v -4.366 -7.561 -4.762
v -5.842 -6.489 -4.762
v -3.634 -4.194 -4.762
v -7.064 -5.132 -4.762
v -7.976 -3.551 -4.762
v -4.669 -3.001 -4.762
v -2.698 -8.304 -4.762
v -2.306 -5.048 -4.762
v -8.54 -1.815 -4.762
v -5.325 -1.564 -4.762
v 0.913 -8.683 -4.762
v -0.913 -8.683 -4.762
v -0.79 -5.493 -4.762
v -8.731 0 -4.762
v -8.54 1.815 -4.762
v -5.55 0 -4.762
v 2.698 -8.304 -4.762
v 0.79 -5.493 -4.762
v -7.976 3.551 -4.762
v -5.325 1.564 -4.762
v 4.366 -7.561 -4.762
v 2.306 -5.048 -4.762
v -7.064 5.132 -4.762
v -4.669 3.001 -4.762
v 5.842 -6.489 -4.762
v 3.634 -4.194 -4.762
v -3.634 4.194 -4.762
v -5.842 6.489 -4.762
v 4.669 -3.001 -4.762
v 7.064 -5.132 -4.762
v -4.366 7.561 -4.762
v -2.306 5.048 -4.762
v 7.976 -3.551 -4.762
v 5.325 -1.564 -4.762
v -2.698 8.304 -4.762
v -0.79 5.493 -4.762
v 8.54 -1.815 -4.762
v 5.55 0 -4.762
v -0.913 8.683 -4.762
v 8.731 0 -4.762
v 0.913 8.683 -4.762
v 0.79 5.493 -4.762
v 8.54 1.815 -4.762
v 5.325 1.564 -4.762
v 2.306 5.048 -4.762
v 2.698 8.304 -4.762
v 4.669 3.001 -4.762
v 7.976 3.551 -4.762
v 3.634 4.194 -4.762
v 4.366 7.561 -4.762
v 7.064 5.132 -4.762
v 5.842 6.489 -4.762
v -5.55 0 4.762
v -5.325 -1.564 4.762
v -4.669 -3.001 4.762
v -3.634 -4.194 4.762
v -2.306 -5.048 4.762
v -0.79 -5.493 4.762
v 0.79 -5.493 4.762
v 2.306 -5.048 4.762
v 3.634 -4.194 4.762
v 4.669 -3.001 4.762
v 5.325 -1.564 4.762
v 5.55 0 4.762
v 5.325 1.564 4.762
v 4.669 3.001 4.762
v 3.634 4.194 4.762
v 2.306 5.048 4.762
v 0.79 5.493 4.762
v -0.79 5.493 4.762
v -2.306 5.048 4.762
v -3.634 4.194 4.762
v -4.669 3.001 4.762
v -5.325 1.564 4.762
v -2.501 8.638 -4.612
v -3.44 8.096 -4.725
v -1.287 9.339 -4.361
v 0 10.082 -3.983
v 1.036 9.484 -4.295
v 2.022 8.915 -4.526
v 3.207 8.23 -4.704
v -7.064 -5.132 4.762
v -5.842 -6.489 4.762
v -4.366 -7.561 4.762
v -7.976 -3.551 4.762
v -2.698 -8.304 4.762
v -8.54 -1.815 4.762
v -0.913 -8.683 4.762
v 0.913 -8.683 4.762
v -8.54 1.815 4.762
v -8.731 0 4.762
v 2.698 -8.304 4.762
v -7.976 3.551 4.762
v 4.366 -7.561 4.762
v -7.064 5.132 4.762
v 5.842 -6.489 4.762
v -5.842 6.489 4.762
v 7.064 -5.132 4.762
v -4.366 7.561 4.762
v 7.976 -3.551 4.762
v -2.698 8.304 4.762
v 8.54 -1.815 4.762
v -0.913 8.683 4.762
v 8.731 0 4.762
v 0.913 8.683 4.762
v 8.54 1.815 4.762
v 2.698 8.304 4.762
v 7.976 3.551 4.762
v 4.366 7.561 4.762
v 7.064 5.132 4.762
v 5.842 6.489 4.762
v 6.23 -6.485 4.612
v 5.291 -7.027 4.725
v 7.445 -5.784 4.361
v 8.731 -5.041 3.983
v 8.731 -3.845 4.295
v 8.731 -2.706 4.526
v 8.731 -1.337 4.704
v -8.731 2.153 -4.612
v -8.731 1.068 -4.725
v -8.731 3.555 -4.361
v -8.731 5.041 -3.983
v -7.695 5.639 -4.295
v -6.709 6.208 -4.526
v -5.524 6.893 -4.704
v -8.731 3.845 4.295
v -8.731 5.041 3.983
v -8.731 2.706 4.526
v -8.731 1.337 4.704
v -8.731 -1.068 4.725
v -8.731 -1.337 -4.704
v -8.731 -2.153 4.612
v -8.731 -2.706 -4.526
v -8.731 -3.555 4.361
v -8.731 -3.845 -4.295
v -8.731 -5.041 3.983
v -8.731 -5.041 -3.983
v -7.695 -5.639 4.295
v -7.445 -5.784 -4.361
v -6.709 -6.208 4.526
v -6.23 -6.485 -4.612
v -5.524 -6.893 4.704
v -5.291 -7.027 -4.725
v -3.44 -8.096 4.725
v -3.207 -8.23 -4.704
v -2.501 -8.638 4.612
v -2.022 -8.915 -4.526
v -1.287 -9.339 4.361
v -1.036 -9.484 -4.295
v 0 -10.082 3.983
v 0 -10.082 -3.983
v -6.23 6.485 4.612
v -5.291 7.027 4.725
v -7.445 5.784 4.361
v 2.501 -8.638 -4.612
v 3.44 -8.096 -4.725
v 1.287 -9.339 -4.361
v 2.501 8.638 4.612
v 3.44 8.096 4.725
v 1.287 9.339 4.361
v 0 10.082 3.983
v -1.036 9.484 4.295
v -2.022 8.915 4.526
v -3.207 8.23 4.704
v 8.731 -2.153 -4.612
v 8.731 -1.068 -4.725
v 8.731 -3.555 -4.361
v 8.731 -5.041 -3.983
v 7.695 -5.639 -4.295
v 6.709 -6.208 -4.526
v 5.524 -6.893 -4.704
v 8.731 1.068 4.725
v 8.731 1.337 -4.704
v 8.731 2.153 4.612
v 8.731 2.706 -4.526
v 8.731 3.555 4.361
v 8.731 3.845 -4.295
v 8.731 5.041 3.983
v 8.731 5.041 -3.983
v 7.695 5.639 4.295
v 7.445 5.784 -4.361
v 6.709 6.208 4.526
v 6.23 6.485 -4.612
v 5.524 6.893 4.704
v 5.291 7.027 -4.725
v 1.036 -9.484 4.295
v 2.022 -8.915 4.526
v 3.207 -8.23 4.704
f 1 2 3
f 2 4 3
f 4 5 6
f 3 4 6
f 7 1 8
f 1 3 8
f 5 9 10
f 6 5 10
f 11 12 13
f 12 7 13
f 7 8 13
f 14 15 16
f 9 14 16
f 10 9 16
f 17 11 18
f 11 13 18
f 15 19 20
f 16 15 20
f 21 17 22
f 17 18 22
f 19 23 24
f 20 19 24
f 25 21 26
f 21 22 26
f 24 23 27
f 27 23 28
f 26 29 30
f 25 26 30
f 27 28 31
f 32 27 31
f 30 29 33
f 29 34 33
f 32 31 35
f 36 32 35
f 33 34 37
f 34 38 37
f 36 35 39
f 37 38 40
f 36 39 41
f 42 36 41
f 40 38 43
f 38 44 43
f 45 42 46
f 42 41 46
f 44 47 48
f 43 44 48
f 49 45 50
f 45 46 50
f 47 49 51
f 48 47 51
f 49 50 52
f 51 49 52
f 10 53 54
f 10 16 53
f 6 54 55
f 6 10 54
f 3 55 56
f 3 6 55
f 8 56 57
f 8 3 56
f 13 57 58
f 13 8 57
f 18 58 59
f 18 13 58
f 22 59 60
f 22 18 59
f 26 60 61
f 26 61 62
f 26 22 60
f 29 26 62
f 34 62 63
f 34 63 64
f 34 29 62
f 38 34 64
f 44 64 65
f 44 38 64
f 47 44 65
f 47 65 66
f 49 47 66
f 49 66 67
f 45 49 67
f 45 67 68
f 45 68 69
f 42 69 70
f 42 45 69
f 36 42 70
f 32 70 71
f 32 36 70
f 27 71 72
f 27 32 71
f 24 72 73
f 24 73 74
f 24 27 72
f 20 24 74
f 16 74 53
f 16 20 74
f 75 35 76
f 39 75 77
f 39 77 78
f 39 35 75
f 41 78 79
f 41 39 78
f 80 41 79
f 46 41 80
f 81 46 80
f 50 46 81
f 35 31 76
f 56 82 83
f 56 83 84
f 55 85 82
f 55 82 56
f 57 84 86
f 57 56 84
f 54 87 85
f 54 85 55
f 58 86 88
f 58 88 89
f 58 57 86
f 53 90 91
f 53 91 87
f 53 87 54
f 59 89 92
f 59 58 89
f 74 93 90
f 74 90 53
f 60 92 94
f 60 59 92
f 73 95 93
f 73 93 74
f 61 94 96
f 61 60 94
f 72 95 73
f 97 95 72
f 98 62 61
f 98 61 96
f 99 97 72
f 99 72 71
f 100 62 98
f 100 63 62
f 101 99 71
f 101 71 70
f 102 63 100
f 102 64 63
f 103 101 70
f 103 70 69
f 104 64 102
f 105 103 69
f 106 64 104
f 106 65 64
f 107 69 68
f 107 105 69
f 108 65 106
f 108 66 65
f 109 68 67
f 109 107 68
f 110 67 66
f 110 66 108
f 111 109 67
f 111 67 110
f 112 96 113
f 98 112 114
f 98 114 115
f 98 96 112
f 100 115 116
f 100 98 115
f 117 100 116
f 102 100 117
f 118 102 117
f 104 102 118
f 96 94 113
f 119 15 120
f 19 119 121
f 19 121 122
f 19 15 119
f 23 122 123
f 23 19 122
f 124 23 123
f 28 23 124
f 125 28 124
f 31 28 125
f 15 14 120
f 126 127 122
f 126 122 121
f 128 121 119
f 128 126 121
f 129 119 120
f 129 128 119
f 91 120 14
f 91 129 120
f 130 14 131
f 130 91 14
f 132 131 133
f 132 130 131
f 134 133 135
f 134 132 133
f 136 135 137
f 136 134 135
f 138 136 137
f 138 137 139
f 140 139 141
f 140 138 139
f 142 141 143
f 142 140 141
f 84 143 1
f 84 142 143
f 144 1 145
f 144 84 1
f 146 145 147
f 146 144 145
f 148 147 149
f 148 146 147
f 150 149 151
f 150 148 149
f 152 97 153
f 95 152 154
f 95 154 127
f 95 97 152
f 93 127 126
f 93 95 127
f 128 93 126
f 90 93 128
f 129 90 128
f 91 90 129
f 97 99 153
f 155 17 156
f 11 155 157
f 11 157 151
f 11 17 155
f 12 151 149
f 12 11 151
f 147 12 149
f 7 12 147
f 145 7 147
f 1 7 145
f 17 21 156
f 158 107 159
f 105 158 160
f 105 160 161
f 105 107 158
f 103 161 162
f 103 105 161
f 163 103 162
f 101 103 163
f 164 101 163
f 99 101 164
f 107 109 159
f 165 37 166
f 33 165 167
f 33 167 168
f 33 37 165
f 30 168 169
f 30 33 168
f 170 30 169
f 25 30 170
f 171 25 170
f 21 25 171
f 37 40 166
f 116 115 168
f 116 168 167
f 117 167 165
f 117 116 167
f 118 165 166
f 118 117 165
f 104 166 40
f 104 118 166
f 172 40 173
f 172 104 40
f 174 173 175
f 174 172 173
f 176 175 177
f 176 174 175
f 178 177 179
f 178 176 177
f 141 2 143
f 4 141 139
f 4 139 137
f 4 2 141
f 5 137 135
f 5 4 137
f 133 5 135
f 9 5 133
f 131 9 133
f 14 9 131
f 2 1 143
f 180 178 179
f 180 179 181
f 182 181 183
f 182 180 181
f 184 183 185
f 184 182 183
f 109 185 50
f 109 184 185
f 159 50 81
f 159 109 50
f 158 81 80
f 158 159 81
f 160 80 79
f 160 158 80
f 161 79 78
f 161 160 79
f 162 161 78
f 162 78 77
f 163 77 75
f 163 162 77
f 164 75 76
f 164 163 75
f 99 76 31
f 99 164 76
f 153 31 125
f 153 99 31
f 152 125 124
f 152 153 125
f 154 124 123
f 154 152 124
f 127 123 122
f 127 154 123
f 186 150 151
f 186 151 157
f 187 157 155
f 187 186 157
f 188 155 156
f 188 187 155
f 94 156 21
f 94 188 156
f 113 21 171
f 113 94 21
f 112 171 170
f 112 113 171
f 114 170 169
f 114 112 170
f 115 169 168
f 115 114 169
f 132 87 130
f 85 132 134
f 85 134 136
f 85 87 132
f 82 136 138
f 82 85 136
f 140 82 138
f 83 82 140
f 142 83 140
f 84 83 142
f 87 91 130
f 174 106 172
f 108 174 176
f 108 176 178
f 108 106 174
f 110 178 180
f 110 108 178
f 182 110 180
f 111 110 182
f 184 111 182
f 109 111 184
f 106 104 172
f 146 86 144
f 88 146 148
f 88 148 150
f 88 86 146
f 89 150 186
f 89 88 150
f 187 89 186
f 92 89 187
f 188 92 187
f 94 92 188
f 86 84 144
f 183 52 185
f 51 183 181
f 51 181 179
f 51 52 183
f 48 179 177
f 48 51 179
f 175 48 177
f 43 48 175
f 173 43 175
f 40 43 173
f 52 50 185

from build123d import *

# Parameters (mm, degrees)
SKETCH1_R               = 5.5499
EXTRUDE1_DEPTH          = 4.7625
SKETCH7_OUTSIDE_W       = 113.114
SKETCH7_OUTSIDE_H       = 115.816
SKETCH7_OUTSIDE_R       = 8.73125
EXTRUDE2_DEPTH          = 25.4
EXTRUDE2_DRAFT          = -60
MIRROR1_COPY_1_SKETCH_W = 113.114
MIRROR1_COPY_1_SKETCH_H = 115.816
MIRROR1_COPY_1_SKETCH_R = 8.73125
MIRROR1_COPY_1_DEPTH    = 25.4
MIRROR1_COPY_1_DRAFT    = -60


with BuildPart() as part:
    # Sketch1 → Extrude1 (new, symmetric)
    with BuildSketch(Plane.XY):
        Polygon((-8.73125, 5.040989538), (-8.73125, -5.040989538), (0, -10.081979076), (8.73125, -5.040989538), (8.73125, 5.040989538), (0, 10.081979076), align=None)
        Circle(SKETCH1_R, mode=Mode.SUBTRACT)
    extrude(amount=EXTRUDE1_DEPTH, both=True)


with BuildPart() as extrude2_tool:
    # Sketch7 outside → Extrude2 (with draft: the straight prism first)
    with BuildSketch(Plane.XY.offset(4.7625)):
        Rectangle(SKETCH7_OUTSIDE_W, SKETCH7_OUTSIDE_H)
        Circle(SKETCH7_OUTSIDE_R, mode=Mode.SUBTRACT)
    extrude(amount=-EXTRUDE2_DEPTH)
    # Extrude2: the draft: its side faces are tilted about the plane it starts from
    extrude2_sides = [extrude2_tool.faces().sort_by_distance(p)[0] for p in [
        (0, -57.908, -7.9375),
        (56.557, 0, -7.9375),
        (0, 57.908, -7.9375),
        (-56.557, 0, -7.9375),
        (-8.73125, 0, -7.9375),
    ]]
    draft(extrude2_sides, Plane.XY.offset(4.7625), EXTRUDE2_DRAFT)


with BuildPart() as part_1:
    add(part.part)

    # Extrude2: cut by extrude2_tool
    add(extrude2_tool.part, mode=Mode.SUBTRACT)


with BuildPart() as mirror1_copy_1_tool:
    # Mirror1 copy 1 sketch → Mirror1 copy 1 (with draft: the straight prism first)
    with BuildSketch(Plane(origin=(0, 0, -4.7625), x_dir=(1, 0, 0), z_dir=(0, 0, -1))):
        Rectangle(MIRROR1_COPY_1_SKETCH_W, MIRROR1_COPY_1_SKETCH_H)
        Circle(MIRROR1_COPY_1_SKETCH_R, mode=Mode.SUBTRACT)
    extrude(amount=-MIRROR1_COPY_1_DEPTH)
    # Mirror1 copy 1: the draft: its side faces are tilted about the plane it starts from
    mirror1_copy_1_sides = [mirror1_copy_1_tool.faces().sort_by_distance(p)[0] for p in [
        (0, -57.908, 7.9375),
        (56.557, 0, 7.9375),
        (0, 57.908, 7.9375),
        (-56.557, 0, 7.9375),
        (-8.73125, 0, 7.9375),
    ]]
    draft(mirror1_copy_1_sides, Plane(origin=(0, 0, -4.7625), x_dir=(1, 0, 0), z_dir=(0, 0, -1)), MIRROR1_COPY_1_DRAFT)


with BuildPart() as part_2:
    add(part_1.part)

    # Mirror1 copy 1: cut by mirror1_copy_1_tool
    add(mirror1_copy_1_tool.part, mode=Mode.SUBTRACT)


solid = part_2.part
